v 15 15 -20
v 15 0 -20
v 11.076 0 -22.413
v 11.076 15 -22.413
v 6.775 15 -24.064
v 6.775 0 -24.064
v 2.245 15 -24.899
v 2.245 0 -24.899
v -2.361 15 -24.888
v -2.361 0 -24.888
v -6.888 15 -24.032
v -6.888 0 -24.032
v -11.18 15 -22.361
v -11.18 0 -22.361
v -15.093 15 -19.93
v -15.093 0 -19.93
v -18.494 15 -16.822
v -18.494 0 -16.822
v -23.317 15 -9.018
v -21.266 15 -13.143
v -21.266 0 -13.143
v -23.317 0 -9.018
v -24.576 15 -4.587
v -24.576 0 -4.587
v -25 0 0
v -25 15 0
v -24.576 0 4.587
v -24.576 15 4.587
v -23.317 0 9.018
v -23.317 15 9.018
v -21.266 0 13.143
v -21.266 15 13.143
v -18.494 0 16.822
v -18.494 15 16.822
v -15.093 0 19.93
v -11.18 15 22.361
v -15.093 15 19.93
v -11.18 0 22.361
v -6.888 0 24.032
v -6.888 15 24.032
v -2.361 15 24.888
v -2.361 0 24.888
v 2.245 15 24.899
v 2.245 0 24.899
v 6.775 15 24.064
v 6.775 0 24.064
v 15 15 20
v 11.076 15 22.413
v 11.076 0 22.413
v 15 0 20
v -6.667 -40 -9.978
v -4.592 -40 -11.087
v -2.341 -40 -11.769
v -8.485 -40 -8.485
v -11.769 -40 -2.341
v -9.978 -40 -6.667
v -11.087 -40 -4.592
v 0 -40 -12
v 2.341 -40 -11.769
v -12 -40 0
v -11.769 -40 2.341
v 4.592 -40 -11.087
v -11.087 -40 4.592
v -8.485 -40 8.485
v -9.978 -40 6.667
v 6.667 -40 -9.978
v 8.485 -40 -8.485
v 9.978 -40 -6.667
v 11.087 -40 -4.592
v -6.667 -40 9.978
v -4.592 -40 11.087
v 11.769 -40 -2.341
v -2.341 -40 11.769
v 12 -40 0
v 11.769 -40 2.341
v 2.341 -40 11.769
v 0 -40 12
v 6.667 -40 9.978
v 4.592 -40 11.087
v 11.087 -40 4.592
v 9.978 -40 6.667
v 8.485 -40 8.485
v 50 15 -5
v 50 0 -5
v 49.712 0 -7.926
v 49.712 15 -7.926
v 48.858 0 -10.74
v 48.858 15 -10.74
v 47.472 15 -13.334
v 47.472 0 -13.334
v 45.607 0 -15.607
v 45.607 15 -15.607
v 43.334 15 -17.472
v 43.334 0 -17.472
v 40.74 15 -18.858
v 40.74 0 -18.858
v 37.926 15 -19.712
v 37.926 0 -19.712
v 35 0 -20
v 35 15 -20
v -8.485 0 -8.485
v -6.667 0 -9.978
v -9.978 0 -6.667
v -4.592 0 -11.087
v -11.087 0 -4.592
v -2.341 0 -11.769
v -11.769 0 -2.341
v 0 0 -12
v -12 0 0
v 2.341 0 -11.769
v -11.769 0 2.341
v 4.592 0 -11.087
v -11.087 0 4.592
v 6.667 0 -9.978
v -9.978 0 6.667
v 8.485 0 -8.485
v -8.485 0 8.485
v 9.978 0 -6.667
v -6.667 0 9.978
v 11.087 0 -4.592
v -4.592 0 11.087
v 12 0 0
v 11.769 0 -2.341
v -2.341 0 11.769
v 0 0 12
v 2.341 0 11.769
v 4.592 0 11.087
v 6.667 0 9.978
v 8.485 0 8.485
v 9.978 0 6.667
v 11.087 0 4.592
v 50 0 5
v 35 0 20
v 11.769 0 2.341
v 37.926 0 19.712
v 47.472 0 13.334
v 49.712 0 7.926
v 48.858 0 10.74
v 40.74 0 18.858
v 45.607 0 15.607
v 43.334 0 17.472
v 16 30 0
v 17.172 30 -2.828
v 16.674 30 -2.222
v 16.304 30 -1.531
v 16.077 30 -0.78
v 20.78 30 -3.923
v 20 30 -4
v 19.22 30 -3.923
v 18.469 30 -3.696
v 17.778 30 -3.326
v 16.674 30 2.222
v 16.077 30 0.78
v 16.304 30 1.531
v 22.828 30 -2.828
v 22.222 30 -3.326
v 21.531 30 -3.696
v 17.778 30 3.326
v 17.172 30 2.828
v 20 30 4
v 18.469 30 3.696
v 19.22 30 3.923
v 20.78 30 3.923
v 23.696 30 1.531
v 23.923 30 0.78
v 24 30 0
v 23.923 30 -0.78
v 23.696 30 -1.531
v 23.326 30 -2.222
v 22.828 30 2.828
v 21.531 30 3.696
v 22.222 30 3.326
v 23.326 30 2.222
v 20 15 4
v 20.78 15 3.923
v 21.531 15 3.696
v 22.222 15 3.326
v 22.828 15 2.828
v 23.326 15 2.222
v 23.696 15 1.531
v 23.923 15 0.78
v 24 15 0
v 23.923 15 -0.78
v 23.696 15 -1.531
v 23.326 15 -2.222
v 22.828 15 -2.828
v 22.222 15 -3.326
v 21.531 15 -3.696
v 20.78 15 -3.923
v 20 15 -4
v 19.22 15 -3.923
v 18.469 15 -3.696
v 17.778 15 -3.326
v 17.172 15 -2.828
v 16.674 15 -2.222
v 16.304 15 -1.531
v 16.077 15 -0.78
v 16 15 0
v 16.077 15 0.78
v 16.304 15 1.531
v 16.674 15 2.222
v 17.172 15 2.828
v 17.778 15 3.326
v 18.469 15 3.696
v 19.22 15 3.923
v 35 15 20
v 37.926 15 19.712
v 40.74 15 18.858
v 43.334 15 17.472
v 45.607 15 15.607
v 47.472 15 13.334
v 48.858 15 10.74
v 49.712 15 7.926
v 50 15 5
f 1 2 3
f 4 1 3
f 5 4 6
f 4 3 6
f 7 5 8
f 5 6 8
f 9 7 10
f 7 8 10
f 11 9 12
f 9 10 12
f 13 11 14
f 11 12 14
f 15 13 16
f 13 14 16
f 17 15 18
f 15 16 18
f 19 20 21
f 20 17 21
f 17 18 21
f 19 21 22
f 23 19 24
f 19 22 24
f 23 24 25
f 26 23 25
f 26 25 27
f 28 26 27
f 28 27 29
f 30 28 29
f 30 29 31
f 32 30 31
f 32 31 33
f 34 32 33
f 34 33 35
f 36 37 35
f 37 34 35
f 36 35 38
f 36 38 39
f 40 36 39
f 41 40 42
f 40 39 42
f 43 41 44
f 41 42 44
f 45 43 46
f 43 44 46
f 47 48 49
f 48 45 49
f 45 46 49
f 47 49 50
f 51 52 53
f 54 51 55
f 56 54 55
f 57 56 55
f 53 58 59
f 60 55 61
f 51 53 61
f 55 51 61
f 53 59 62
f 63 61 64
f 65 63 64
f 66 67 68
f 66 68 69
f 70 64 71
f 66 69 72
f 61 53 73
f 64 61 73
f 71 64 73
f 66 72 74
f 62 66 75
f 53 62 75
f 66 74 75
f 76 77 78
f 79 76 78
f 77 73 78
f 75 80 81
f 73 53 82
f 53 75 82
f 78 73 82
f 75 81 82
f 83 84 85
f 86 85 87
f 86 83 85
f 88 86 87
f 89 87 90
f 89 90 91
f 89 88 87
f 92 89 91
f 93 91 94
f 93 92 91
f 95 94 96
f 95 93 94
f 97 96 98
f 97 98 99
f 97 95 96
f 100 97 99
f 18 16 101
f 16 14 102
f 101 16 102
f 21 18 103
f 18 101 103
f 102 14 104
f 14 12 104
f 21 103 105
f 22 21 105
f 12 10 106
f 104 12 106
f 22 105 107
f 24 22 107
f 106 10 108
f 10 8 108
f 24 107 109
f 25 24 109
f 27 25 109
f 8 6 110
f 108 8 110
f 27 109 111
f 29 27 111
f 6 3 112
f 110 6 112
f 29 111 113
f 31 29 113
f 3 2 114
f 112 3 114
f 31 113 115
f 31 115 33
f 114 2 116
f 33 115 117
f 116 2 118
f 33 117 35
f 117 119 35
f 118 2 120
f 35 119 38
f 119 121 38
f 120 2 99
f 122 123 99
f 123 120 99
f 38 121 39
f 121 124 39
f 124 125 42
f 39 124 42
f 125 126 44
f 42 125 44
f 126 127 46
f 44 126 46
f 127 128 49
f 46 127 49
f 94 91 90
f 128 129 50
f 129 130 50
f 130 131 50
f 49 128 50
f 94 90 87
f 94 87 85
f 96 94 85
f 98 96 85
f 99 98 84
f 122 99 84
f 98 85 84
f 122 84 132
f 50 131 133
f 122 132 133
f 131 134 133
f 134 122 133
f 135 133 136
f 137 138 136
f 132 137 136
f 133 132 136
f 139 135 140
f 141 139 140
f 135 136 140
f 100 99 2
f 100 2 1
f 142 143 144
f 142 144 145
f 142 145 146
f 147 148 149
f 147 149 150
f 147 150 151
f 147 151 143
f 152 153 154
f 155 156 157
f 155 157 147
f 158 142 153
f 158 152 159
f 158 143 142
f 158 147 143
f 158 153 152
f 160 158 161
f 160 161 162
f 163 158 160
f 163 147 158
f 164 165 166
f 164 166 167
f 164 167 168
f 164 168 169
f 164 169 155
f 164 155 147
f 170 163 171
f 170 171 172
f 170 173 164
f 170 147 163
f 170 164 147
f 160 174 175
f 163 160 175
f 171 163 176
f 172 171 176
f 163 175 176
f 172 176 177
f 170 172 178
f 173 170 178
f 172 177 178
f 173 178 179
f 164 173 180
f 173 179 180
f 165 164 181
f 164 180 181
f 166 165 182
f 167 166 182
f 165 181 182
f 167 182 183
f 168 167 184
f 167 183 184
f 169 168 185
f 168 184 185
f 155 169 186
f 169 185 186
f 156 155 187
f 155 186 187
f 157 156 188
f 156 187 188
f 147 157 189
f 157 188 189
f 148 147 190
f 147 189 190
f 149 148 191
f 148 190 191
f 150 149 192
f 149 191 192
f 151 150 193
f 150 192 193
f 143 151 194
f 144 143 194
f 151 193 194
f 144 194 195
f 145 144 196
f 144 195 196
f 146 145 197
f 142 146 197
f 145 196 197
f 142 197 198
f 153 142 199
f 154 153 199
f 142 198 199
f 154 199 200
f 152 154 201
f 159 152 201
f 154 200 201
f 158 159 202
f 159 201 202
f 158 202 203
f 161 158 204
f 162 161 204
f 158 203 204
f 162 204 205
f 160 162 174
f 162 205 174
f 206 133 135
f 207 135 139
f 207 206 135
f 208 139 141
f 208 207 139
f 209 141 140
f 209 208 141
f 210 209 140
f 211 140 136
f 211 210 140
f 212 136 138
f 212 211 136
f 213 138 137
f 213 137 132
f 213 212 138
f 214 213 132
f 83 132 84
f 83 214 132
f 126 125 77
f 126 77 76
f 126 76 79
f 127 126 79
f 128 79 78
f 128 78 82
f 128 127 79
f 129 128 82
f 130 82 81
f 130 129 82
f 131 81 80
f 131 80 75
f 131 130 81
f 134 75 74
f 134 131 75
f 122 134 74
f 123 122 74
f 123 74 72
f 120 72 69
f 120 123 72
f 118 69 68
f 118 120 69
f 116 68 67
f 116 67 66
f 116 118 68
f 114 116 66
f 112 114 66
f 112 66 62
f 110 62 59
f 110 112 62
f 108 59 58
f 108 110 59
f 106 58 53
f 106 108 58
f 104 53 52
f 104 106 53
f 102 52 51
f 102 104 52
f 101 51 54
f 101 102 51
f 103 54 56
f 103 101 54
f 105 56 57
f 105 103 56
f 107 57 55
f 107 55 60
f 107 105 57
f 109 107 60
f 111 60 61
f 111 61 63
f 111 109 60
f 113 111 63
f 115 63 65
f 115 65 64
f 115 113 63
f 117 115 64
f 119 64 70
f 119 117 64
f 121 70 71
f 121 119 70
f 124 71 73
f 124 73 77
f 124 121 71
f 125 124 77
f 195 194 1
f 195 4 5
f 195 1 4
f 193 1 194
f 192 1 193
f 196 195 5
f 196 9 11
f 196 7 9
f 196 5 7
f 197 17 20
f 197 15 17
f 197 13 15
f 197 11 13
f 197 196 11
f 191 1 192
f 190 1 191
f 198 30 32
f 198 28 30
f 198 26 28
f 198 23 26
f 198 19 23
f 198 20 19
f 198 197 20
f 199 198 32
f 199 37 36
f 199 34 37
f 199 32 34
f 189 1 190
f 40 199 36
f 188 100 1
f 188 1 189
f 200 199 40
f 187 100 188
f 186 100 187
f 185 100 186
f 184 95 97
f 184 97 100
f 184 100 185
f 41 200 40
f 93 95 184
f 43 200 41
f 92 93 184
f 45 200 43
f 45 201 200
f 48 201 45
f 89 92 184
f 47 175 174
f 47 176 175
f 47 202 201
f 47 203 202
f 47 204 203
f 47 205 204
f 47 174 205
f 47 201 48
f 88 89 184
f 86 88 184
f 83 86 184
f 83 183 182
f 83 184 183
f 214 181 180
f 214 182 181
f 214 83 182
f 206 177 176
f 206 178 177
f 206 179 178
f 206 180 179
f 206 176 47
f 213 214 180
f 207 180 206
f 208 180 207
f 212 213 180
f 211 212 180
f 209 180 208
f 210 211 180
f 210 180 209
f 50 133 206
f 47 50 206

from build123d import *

# Parameters (mm, degrees)
SKETCH1_R                = 25
BOSS_EXTRUDE1_DEPTH      = 15
SKETCH1_3_R              = 12
BOSS_EXTRUDE2_DEPTH      = 40
BOSS_EXTRUDE4_REACH      = 105.385
BOSS_EXTRUDE4_END_RADIUS = 25
BOSS_EXTRUDE4_START      = 50
SKETCH4_W                = 40
SKETCH4_H                = 15
FILLET2_R                = 15
BOSS_EXTRUDE8_START      = 15
SKETCH7_R                = 4
BOSS_EXTRUDE8_DEPTH      = 15


with BuildPart() as part:
    # Sketch1 → Boss-Extrude1 (new body)
    with BuildSketch(Plane(origin=(0, 0, 0), x_dir=(1, 0, 0), z_dir=(0, 1, 0))):
        with Locations(Location((0, 0, 0), (0, 0, 270))):
            Circle(SKETCH1_R)
    extrude(amount=BOSS_EXTRUDE1_DEPTH)

    # Sketch1<3> → Boss-Extrude2 (add)
    with BuildSketch(Plane(origin=(0, 0, 0), x_dir=(1, 0, 0), z_dir=(0, 1, 0))):
        with Locations(Location((0, 0, 0), (0, 0, 270))):
            Circle(SKETCH1_3_R)
    extrude(amount=-BOSS_EXTRUDE2_DEPTH)

    # Boss-Extrude4: up to this cylinder (the profile starts outside it)
    boss_extrude4_end = Plane(origin=(0, 7.5, 0), z_dir=(0, -1, 0)) * Cylinder(BOSS_EXTRUDE4_END_RADIUS, 261.77, mode=Mode.PRIVATE)
    # Sketch4 → Boss-Extrude4 (add, up to the surface)
    with BuildSketch(Plane(origin=(0, 0, 0), x_dir=(0, 0, -1), z_dir=(1, 0, 0)).offset(BOSS_EXTRUDE4_START), mode=Mode.PRIVATE) as boss_extrude4_sk1:
        with Locations((0, 7.5)):
            Rectangle(SKETCH4_W, SKETCH4_H)
    boss_extrude4_tool1 = extrude(boss_extrude4_sk1.sketch, amount=-BOSS_EXTRUDE4_REACH, mode=Mode.PRIVATE) - boss_extrude4_end
    add(boss_extrude4_tool1.solids().sort_by_distance((50, 7.5, 0))[0])

    # Fillet2
    fillet2_edges = [part.edges().sort_by_distance(p)[0] for p in [
        (50, 7.5, -20),
        (50, 7.5, 20),
    ]]
    fillet(fillet2_edges, radius=FILLET2_R)

    # Sketch7 → Boss-Extrude8 (add)
    with BuildSketch(Plane(origin=(0, 0, 0), x_dir=(1, 0, 0), z_dir=(0, 1, 0)).offset(BOSS_EXTRUDE8_START)):
        with Locations(Location((20, 0, 0), (0, 0, 270))):
            Circle(SKETCH7_R)
    extrude(amount=BOSS_EXTRUDE8_DEPTH)


solid = part.part
